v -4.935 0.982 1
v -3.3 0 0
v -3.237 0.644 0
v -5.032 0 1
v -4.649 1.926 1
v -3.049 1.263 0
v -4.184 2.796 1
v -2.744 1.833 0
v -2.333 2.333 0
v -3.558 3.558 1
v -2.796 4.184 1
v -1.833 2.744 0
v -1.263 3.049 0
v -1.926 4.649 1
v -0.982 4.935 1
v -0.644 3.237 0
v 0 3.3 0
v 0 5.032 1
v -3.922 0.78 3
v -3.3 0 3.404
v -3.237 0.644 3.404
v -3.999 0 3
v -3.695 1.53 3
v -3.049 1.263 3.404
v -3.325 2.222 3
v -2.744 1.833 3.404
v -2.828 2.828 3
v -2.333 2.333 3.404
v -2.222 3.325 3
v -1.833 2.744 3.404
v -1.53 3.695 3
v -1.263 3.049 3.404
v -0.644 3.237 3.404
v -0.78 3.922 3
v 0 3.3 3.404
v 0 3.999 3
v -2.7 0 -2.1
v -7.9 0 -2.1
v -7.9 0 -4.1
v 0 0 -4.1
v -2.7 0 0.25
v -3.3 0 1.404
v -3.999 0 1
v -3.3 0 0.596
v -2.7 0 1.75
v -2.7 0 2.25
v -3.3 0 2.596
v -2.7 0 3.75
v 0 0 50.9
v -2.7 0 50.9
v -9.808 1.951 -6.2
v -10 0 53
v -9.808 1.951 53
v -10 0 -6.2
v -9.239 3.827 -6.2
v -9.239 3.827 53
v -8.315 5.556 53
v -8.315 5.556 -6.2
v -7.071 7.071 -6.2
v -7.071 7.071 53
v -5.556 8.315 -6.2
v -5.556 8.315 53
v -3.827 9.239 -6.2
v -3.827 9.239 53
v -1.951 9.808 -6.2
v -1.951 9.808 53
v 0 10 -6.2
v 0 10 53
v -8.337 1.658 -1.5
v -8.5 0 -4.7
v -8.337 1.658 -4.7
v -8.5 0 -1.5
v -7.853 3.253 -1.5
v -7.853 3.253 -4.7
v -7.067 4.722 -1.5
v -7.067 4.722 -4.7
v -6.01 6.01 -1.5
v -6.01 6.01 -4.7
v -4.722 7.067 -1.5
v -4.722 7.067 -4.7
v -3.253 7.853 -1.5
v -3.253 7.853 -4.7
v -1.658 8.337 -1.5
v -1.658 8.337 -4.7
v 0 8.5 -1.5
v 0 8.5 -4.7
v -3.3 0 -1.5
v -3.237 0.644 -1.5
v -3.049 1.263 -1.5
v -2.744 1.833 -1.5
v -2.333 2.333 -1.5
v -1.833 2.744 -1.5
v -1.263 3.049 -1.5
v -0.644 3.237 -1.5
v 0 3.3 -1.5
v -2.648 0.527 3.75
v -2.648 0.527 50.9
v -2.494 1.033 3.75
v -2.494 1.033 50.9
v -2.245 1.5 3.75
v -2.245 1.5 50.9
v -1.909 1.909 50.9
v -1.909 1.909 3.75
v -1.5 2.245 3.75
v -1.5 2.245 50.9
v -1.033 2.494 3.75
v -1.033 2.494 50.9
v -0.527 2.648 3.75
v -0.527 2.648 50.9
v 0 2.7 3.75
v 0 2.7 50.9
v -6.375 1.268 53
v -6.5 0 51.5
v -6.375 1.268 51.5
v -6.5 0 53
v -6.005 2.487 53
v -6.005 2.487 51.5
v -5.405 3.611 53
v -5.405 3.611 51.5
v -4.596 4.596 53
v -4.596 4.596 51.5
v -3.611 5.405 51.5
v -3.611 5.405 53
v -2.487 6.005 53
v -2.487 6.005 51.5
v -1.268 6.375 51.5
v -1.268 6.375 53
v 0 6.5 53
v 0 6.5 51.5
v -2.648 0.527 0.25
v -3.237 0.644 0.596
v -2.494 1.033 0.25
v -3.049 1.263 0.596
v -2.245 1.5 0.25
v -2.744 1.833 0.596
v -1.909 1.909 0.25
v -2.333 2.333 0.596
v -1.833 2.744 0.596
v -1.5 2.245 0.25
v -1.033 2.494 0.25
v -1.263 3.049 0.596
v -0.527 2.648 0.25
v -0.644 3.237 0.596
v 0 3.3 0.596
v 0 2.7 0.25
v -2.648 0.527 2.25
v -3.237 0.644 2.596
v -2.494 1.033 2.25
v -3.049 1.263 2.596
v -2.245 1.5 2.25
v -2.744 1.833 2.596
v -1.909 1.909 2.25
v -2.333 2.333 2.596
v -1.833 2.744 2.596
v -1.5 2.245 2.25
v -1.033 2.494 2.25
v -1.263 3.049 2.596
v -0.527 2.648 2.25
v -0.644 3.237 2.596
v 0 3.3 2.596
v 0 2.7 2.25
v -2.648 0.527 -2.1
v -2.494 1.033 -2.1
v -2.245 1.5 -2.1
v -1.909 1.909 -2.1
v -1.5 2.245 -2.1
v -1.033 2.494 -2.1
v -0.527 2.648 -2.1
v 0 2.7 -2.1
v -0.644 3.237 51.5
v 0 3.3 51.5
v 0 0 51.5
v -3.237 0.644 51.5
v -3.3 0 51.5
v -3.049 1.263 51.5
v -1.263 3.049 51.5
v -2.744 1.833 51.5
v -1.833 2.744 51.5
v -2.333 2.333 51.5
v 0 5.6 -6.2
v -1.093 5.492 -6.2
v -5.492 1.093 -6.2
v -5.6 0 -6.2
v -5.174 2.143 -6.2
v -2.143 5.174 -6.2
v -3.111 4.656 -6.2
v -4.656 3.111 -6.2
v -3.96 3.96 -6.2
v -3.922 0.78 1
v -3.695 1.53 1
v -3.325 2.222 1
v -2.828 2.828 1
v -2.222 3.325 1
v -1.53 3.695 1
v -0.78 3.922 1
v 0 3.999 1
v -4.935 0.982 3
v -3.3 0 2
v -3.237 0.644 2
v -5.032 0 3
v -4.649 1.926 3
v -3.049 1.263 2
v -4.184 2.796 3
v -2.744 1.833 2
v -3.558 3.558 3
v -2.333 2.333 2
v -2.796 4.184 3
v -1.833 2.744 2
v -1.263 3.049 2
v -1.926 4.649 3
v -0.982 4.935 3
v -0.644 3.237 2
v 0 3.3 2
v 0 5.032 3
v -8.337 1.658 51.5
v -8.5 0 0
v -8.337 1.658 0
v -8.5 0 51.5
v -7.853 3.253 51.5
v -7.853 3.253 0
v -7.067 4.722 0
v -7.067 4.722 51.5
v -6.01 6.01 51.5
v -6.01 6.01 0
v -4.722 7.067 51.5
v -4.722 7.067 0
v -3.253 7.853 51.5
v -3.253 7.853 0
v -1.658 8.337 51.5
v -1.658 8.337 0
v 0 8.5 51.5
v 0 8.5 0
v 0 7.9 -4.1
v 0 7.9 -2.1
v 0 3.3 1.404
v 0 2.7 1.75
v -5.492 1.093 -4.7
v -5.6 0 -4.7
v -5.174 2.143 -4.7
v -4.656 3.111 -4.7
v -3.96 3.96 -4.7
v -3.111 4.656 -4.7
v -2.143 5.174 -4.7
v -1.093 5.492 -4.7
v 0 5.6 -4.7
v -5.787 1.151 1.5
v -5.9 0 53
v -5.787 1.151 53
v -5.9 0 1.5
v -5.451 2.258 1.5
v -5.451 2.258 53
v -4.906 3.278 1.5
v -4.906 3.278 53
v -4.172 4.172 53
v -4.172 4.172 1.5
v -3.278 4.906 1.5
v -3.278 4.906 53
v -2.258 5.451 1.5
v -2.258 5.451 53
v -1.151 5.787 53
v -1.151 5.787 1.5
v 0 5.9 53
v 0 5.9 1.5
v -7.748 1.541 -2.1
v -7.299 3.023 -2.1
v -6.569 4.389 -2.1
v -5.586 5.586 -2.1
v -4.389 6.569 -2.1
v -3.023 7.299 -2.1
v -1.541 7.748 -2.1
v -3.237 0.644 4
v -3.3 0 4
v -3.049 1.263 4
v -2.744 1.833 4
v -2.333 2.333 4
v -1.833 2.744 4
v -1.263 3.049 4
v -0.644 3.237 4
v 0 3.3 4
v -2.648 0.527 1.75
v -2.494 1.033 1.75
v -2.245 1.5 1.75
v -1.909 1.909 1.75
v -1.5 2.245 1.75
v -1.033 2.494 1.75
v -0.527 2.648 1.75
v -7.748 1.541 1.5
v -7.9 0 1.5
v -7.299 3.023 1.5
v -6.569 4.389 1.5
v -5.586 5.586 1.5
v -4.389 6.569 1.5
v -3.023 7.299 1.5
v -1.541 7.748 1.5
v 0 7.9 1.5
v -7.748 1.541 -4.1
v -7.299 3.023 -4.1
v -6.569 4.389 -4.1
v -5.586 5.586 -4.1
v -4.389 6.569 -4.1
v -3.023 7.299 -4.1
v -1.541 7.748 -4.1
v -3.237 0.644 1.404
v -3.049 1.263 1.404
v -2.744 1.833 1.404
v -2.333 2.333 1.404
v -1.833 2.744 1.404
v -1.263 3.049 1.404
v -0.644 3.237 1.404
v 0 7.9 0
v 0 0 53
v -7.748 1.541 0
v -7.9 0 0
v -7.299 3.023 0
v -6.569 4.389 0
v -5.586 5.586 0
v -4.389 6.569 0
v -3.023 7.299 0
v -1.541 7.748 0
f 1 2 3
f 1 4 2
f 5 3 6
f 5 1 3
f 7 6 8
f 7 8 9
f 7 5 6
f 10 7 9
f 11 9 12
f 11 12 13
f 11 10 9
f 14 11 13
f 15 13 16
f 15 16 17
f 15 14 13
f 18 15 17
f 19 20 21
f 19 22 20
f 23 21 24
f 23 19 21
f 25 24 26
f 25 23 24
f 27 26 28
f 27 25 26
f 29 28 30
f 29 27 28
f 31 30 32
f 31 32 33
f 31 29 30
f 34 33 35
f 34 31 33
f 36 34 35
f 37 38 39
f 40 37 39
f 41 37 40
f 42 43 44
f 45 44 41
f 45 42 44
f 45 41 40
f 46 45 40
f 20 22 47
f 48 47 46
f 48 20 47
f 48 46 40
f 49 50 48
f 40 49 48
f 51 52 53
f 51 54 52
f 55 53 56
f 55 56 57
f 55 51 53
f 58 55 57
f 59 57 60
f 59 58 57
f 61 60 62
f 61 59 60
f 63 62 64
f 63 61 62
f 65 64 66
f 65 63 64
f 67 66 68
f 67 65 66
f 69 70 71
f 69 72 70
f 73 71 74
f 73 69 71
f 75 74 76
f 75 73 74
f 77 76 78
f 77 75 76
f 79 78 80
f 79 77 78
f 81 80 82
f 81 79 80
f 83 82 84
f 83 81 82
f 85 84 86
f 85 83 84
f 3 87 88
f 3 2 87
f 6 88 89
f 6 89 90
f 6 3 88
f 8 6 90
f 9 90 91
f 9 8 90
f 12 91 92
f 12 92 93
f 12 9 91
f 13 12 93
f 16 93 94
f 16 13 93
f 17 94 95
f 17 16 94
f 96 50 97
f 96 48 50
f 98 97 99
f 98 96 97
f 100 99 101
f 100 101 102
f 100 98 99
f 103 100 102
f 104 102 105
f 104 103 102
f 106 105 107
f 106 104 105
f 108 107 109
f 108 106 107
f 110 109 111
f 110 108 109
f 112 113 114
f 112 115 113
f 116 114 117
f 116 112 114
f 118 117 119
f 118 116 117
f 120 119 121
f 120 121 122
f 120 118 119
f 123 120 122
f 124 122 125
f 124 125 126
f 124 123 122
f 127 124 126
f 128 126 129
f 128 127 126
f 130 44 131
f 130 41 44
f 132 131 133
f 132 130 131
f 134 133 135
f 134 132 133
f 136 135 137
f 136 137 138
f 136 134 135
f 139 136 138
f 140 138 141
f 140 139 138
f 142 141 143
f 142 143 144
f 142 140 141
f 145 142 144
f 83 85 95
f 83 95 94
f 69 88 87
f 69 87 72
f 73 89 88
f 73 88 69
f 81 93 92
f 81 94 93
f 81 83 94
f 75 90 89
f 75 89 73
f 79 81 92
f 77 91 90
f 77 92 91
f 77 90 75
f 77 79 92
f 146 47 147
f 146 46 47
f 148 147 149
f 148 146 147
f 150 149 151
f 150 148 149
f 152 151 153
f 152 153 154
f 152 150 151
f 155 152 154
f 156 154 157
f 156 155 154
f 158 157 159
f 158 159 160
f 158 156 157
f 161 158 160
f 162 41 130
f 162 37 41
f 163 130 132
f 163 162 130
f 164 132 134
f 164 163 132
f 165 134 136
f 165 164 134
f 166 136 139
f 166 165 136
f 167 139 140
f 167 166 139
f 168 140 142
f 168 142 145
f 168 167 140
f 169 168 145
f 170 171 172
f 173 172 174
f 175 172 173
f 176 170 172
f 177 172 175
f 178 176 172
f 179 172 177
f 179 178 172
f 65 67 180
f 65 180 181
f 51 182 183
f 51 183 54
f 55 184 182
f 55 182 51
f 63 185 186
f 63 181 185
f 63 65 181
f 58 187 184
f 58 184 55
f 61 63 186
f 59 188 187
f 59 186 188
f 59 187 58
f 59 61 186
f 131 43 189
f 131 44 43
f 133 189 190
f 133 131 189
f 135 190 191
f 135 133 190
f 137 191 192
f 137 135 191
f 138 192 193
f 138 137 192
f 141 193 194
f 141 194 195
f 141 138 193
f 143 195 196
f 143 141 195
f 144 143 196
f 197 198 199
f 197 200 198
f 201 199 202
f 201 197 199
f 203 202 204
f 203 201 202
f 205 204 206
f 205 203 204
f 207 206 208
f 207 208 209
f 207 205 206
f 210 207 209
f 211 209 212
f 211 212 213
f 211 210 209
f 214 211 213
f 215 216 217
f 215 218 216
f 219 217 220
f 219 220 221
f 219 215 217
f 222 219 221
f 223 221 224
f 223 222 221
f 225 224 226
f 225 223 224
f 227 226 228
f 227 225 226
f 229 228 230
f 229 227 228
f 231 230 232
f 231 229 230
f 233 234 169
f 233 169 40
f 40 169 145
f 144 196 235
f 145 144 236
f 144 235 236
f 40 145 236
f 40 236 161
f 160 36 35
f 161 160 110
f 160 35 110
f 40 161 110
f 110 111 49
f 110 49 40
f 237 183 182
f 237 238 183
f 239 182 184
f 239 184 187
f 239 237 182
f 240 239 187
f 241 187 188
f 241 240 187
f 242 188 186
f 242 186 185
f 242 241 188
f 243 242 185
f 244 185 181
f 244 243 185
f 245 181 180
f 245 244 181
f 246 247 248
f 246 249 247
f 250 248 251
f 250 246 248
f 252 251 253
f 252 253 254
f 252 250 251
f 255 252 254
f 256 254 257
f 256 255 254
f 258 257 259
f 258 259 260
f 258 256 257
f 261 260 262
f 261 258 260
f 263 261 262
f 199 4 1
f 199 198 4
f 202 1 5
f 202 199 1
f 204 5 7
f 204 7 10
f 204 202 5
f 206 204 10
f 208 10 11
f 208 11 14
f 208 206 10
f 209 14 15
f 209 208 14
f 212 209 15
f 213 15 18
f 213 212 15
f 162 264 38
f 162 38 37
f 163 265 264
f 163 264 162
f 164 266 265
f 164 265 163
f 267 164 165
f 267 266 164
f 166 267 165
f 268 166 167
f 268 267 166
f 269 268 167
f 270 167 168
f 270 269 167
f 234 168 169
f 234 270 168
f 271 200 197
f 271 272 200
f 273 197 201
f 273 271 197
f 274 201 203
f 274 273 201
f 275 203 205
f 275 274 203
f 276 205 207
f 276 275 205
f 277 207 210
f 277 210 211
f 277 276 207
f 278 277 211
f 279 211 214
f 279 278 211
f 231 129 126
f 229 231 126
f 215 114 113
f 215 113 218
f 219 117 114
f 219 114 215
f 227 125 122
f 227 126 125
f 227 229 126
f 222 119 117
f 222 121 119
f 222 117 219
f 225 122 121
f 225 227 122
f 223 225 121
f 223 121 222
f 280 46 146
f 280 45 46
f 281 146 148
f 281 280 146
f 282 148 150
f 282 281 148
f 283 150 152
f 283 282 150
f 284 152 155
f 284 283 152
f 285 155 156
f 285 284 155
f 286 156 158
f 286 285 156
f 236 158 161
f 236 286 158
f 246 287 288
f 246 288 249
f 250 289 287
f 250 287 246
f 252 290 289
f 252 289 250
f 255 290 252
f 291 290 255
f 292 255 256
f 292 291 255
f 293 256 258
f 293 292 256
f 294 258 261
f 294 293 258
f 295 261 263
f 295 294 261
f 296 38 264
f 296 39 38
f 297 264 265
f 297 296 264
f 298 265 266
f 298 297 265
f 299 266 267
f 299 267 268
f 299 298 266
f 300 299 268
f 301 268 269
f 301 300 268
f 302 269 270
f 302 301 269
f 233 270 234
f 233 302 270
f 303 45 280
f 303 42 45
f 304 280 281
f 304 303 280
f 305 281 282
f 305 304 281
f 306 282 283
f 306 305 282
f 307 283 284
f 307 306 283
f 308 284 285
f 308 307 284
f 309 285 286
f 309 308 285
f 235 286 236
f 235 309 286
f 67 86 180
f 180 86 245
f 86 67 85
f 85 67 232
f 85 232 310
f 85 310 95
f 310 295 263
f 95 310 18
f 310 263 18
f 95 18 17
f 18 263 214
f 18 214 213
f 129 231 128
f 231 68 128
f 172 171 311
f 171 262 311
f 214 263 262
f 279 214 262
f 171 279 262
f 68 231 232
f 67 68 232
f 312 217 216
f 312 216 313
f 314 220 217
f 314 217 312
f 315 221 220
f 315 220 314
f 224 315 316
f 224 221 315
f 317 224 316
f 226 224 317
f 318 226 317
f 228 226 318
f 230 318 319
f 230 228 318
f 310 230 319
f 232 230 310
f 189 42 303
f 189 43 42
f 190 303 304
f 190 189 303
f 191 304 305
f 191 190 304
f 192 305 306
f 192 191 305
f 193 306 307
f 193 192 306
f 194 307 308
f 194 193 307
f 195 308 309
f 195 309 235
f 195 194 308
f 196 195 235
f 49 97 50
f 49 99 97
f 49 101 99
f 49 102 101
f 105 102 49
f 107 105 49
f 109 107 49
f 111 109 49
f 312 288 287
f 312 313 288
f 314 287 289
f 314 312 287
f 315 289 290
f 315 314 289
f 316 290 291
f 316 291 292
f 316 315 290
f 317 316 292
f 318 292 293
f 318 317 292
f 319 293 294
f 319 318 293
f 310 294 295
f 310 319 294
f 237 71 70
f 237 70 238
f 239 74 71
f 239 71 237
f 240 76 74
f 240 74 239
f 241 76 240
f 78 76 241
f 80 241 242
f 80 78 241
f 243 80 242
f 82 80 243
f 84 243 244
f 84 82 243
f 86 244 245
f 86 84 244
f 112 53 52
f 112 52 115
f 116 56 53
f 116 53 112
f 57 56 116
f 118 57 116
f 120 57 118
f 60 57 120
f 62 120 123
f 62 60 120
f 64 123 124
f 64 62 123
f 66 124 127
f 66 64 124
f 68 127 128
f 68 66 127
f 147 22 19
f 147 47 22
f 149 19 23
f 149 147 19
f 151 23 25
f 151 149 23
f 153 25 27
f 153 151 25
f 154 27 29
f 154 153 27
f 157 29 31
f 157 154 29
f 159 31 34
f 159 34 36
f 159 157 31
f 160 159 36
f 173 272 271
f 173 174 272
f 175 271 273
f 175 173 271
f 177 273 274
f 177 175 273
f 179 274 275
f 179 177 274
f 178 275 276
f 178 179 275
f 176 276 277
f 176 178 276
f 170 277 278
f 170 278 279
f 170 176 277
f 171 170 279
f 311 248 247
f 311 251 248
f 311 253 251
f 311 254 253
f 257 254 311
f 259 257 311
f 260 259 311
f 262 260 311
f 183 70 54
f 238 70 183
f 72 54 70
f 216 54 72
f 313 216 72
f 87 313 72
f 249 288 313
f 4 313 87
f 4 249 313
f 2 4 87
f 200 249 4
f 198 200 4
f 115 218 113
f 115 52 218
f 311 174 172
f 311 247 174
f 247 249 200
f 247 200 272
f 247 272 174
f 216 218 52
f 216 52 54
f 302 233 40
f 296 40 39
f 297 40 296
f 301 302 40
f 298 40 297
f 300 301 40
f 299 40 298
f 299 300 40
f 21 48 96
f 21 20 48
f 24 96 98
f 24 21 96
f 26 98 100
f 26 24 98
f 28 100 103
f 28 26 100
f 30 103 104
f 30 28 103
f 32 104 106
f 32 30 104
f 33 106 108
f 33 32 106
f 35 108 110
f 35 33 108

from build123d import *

# Parameters (mm, degrees)
F1_ANGLE = 90


with BuildPart() as f1:
    # F0 (on Front) → F1 (revolve)
    with BuildSketch(Plane.XZ):
        Polygon((-8.5, -1.5), (-3.3, -1.5), (-3.3, 0), (-7.9, 0), (-8.5, 0), (-8.5, 51.5), (-6.5, 51.5), (-6.5, 53), (-10, 53), (-10, -6.2), (-5.6, -6.2), (-5.6, -4.7), (-8.5, -4.7), align=None)
        Polygon((-7.9, 0), (-3.3, 0), (-5.0320508076, 1), (-3.3, 2), (-5.0320508076, 3), (-3.3, 4), (-3.3, 51.5), (0, 51.5), (0, 53), (-5.9, 53), (-5.9, 1.5), (-7.9, 1.5), align=None)
    revolve(axis=Axis((0, 0, 0), (0, 0, -1)), revolution_arc=F1_ANGLE)


with BuildPart() as f1b:
    # F0 (on Front) → F1, piece 2 (revolve)
    with BuildSketch(Plane.XZ):
        Polygon((-2.7, 1.75), (-2.7, 0.25), (-2.7, 0), (-2.7, -2.1), (-7.9, -2.1), (-7.9, -4.1), (0, -4.1), (0, 50), (0, 50.9), (-2.7, 50.9), (-2.7, 3.75), (-2.7, 2.25), align=None)
        Polygon((-3.9990381057, 1), (-3.3, 0.5964101615), (-3.3, 1.4035898385), align=None)
        Polygon((-3.3, 1.4035898385), (-3.3, 0.5964101615), (-2.7, 0.25), (-2.7, 1.75), align=None)
        Polygon((-3.9990381057, 3), (-3.3, 2.5964101615), (-3.3, 3.4035898385), align=None)
        Polygon((-3.3, 3.4035898385), (-3.3, 2.5964101615), (-2.7, 2.25), (-2.7, 3.75), align=None)
    revolve(axis=Axis((0, 0, 0), (0, 0, -1)), revolution_arc=F1_ANGLE)


solid = Compound([f1.part, f1b.part])
